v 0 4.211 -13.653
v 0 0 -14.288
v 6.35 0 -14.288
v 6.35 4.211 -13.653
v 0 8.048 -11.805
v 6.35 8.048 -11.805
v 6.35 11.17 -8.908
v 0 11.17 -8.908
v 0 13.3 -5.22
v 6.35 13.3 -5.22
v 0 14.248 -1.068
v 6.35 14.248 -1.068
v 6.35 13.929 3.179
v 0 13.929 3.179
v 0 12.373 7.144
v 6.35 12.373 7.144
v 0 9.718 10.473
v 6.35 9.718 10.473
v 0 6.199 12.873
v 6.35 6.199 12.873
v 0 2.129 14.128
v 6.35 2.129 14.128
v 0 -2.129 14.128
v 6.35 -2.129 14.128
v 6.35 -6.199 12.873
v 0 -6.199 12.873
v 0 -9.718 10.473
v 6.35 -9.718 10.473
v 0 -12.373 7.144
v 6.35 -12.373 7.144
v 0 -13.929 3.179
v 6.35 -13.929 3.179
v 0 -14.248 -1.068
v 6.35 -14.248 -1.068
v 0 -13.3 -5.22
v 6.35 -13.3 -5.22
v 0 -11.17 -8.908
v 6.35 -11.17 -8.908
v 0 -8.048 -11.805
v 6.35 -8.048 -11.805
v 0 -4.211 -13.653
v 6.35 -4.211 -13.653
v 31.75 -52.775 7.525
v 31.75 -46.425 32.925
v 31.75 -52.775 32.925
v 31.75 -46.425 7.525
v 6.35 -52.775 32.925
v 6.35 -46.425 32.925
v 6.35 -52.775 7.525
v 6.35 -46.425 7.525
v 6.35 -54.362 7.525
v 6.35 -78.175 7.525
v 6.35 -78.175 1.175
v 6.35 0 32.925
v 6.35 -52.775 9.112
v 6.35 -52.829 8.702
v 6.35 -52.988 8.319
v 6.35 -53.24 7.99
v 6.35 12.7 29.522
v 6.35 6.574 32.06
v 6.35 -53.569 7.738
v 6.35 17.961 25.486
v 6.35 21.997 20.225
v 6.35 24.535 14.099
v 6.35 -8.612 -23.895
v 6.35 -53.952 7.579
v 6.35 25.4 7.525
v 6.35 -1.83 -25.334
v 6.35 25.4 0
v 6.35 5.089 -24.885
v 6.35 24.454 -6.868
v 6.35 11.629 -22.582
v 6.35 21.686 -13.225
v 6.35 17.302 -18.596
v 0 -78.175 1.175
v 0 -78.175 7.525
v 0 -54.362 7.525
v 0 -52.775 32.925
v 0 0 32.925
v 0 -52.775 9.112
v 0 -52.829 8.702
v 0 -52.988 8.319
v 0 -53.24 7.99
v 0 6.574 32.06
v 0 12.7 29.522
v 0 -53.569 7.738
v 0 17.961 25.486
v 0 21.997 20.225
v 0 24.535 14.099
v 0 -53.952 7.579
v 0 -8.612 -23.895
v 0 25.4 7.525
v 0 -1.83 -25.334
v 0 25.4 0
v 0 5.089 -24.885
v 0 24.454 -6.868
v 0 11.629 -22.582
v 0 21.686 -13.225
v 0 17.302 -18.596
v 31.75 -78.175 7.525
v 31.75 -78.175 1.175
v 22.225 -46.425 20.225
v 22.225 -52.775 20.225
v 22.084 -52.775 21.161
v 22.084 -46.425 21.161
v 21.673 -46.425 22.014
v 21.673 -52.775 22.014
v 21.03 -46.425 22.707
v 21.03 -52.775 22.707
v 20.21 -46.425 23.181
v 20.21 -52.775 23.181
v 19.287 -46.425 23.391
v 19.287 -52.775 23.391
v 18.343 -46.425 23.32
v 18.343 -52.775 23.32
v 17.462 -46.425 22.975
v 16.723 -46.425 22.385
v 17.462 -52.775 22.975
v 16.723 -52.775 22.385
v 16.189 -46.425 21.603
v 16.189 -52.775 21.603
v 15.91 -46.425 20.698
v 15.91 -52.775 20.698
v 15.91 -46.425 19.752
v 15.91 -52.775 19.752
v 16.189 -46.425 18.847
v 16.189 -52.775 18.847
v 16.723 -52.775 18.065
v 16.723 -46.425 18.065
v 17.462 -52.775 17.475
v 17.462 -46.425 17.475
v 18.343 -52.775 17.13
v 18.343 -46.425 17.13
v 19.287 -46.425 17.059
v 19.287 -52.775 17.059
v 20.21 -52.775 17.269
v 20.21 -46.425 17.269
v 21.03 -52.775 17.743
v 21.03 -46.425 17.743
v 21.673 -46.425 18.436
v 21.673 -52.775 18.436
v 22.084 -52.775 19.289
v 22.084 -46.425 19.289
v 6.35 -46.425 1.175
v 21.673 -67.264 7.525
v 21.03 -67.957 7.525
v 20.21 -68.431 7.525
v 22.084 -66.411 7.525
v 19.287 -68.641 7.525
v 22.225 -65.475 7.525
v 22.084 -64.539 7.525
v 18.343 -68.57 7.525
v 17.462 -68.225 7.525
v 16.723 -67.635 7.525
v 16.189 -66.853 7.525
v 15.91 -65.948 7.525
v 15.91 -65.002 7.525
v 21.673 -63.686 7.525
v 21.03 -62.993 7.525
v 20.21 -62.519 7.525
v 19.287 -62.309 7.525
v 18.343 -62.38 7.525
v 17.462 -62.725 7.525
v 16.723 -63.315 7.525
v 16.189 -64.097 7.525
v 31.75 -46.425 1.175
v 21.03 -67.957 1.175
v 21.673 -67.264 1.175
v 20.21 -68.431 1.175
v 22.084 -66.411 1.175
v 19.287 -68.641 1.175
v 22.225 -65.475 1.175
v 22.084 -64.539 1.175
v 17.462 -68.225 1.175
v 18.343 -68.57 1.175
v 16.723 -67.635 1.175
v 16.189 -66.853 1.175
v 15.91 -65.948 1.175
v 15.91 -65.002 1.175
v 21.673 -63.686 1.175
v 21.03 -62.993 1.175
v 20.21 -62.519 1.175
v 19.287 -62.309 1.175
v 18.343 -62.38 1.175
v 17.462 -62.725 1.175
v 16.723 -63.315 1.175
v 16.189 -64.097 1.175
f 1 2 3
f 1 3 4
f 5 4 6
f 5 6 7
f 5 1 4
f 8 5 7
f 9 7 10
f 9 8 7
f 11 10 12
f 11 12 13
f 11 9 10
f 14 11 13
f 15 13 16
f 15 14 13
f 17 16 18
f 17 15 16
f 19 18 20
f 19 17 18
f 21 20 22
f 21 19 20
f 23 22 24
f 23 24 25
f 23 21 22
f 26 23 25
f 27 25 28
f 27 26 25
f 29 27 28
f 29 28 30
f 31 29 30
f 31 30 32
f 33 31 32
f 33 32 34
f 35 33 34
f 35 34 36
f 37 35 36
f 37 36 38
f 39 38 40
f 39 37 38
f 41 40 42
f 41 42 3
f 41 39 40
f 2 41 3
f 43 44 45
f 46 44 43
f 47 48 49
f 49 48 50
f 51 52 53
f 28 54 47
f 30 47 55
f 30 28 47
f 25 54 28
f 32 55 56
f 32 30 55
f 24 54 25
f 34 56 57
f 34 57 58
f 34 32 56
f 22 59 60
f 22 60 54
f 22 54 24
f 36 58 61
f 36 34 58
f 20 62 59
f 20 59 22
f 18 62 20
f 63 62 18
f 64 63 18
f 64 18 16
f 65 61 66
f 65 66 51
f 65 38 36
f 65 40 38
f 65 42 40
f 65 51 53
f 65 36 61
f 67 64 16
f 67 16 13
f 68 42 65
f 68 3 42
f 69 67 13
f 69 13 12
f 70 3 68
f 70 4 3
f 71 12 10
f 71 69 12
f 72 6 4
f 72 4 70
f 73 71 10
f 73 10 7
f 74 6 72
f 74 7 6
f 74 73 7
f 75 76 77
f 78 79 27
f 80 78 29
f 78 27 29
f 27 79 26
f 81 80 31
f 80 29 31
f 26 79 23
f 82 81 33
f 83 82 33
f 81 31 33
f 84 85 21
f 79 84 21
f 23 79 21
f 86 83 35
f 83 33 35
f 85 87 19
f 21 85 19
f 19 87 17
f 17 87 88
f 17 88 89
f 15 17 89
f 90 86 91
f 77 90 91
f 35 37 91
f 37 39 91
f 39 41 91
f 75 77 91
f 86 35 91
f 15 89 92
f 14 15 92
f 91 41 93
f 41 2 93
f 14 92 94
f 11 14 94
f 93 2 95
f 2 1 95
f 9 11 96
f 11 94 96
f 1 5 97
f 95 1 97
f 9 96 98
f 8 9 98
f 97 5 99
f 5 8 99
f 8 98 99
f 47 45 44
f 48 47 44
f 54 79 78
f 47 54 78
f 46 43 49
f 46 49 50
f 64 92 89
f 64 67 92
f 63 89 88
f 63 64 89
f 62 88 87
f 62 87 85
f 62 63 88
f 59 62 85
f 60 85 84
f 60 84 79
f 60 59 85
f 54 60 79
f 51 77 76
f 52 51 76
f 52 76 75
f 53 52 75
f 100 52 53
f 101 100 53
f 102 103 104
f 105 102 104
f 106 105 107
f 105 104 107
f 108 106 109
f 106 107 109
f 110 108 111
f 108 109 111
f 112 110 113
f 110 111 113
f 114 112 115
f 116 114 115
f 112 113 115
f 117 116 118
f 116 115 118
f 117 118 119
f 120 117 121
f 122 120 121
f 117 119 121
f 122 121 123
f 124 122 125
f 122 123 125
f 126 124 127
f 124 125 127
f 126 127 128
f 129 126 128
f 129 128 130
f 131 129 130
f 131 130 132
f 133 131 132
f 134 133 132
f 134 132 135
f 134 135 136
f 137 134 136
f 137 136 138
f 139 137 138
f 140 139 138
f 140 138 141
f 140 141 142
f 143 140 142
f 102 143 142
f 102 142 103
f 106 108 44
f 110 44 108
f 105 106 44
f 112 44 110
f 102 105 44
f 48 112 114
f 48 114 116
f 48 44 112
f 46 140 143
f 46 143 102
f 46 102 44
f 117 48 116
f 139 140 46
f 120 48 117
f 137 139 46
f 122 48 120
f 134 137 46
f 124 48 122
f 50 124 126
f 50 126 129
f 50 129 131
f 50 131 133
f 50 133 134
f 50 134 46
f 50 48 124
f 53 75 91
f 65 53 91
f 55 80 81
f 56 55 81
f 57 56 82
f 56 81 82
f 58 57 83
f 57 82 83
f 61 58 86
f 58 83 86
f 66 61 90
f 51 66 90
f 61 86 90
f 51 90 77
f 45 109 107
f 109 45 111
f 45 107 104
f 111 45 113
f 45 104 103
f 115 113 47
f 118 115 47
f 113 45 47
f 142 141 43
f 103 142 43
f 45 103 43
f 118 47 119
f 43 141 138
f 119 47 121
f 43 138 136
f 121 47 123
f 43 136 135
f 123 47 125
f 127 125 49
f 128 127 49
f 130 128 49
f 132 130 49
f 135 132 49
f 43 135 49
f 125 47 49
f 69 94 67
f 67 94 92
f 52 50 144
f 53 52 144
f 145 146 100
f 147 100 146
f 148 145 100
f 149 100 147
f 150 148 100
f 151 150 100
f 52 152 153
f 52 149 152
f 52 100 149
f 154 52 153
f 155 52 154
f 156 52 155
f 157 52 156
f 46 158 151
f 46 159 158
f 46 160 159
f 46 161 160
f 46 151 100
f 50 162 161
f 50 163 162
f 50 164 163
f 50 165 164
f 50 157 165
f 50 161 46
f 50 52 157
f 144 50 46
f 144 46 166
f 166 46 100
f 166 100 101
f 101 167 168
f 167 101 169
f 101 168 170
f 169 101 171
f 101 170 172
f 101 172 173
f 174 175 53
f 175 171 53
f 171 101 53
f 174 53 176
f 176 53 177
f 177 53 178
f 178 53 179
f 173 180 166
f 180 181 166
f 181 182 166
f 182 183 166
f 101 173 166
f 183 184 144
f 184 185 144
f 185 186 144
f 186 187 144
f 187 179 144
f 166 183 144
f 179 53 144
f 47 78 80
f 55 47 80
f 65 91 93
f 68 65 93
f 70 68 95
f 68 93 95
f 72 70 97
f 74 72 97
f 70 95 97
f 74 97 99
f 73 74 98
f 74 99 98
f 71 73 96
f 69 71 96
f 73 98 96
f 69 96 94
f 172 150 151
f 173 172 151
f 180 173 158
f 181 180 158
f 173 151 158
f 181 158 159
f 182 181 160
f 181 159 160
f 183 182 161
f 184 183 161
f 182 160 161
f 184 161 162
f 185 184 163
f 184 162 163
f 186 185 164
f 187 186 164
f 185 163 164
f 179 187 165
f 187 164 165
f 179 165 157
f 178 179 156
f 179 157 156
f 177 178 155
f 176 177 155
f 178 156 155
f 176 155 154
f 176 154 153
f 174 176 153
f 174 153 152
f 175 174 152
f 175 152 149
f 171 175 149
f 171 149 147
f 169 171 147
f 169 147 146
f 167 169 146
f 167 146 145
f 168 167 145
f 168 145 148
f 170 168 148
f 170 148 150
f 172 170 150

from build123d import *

# Parameters (mm, degrees)
SKETCH1_R           = 14.2875
BOSS_EXTRUDE1_DEPTH = 6.35
SKETCH2_W           = 25.4
SKETCH2_H           = 6.35
BOSS_EXTRUDE2_DEPTH = 25.4
FILLET1_R           = 25.4
SKETCH3_W           = 6.35
SKETCH3_H           = 31.75
BOSS_EXTRUDE3_DEPTH = 25.4
SKETCH4_R           = 3.175
CUT_EXTRUDE1_DEPTH  = 79.175
SKETCH5_R           = 3.175
CUT_EXTRUDE2_DEPTH  = 33.925


with BuildPart() as part:
    # Sketch1 → Boss-Extrude1 (new body)
    with BuildSketch(Plane(origin=(0, 0, 0), x_dir=(0, 0, -1), z_dir=(1, 0, 0))):
        with BuildLine():
            Line((0, 25.4), (-32.925, 25.4))
            Line((-32.925, 25.4), (-32.925, -52.775))
            Line((-32.925, -52.775), (-9.1125, -52.775))
            ThreePointArc((-9.1125, -52.775), (-7.989967985, -53.239967985), (-7.525, -54.3625))
            Line((-7.525, -54.3625), (-7.525, -78.175))
            Line((-7.525, -78.175), (-1.175, -78.175))
            Line((-1.175, -78.175), (23.895496523, -8.611924636))
            ThreePointArc((23.895496523, -8.611924636), (20.783441555, 14.601662821), (0, 25.4))
        make_face()
        Circle(SKETCH1_R, mode=Mode.SUBTRACT)
    extrude(amount=BOSS_EXTRUDE1_DEPTH)

    # Fillet1
    fillet1_edges = [part.edges().sort_by_distance(p)[0] for p in [
        (3.175, 25.4, 32.925),
    ]]
    fillet(fillet1_edges, radius=FILLET1_R)


with BuildPart() as body_2:
    # Sketch2 → Boss-Extrude2 (new body)
    with BuildSketch(Plane(origin=(6.35, 0, 0), x_dir=(0, 0, -1), z_dir=(1, 0, 0))):
        with Locations((-20.225, -49.6)):
            Rectangle(SKETCH2_W, SKETCH2_H)
    extrude(amount=BOSS_EXTRUDE2_DEPTH)

    # Sketch4 → Cut-Extrude1 (cut, through all)
    with BuildSketch(Plane.XZ.offset(52.775)):
        with Locations((19.05, 20.225)):
            Circle(SKETCH4_R)
    extrude(amount=-CUT_EXTRUDE1_DEPTH, mode=Mode.SUBTRACT)


with BuildPart() as body_3:
    # Sketch3 → Boss-Extrude3 (new body)
    with BuildSketch(Plane(origin=(6.35, 0, 0), x_dir=(0, 0, -1), z_dir=(1, 0, 0))):
        with Locations((-4.35, -62.3)):
            Rectangle(SKETCH3_W, SKETCH3_H)
    extrude(amount=BOSS_EXTRUDE3_DEPTH)

    # Sketch5 → Cut-Extrude2 (cut, through all)
    with BuildSketch(Plane.XY.offset(7.525)):
        with Locations((19.05, -65.475)):
            Circle(SKETCH5_R)
    extrude(amount=-CUT_EXTRUDE2_DEPTH, mode=Mode.SUBTRACT)


solid = Compound([part.part, body_2.part, body_3.part])
